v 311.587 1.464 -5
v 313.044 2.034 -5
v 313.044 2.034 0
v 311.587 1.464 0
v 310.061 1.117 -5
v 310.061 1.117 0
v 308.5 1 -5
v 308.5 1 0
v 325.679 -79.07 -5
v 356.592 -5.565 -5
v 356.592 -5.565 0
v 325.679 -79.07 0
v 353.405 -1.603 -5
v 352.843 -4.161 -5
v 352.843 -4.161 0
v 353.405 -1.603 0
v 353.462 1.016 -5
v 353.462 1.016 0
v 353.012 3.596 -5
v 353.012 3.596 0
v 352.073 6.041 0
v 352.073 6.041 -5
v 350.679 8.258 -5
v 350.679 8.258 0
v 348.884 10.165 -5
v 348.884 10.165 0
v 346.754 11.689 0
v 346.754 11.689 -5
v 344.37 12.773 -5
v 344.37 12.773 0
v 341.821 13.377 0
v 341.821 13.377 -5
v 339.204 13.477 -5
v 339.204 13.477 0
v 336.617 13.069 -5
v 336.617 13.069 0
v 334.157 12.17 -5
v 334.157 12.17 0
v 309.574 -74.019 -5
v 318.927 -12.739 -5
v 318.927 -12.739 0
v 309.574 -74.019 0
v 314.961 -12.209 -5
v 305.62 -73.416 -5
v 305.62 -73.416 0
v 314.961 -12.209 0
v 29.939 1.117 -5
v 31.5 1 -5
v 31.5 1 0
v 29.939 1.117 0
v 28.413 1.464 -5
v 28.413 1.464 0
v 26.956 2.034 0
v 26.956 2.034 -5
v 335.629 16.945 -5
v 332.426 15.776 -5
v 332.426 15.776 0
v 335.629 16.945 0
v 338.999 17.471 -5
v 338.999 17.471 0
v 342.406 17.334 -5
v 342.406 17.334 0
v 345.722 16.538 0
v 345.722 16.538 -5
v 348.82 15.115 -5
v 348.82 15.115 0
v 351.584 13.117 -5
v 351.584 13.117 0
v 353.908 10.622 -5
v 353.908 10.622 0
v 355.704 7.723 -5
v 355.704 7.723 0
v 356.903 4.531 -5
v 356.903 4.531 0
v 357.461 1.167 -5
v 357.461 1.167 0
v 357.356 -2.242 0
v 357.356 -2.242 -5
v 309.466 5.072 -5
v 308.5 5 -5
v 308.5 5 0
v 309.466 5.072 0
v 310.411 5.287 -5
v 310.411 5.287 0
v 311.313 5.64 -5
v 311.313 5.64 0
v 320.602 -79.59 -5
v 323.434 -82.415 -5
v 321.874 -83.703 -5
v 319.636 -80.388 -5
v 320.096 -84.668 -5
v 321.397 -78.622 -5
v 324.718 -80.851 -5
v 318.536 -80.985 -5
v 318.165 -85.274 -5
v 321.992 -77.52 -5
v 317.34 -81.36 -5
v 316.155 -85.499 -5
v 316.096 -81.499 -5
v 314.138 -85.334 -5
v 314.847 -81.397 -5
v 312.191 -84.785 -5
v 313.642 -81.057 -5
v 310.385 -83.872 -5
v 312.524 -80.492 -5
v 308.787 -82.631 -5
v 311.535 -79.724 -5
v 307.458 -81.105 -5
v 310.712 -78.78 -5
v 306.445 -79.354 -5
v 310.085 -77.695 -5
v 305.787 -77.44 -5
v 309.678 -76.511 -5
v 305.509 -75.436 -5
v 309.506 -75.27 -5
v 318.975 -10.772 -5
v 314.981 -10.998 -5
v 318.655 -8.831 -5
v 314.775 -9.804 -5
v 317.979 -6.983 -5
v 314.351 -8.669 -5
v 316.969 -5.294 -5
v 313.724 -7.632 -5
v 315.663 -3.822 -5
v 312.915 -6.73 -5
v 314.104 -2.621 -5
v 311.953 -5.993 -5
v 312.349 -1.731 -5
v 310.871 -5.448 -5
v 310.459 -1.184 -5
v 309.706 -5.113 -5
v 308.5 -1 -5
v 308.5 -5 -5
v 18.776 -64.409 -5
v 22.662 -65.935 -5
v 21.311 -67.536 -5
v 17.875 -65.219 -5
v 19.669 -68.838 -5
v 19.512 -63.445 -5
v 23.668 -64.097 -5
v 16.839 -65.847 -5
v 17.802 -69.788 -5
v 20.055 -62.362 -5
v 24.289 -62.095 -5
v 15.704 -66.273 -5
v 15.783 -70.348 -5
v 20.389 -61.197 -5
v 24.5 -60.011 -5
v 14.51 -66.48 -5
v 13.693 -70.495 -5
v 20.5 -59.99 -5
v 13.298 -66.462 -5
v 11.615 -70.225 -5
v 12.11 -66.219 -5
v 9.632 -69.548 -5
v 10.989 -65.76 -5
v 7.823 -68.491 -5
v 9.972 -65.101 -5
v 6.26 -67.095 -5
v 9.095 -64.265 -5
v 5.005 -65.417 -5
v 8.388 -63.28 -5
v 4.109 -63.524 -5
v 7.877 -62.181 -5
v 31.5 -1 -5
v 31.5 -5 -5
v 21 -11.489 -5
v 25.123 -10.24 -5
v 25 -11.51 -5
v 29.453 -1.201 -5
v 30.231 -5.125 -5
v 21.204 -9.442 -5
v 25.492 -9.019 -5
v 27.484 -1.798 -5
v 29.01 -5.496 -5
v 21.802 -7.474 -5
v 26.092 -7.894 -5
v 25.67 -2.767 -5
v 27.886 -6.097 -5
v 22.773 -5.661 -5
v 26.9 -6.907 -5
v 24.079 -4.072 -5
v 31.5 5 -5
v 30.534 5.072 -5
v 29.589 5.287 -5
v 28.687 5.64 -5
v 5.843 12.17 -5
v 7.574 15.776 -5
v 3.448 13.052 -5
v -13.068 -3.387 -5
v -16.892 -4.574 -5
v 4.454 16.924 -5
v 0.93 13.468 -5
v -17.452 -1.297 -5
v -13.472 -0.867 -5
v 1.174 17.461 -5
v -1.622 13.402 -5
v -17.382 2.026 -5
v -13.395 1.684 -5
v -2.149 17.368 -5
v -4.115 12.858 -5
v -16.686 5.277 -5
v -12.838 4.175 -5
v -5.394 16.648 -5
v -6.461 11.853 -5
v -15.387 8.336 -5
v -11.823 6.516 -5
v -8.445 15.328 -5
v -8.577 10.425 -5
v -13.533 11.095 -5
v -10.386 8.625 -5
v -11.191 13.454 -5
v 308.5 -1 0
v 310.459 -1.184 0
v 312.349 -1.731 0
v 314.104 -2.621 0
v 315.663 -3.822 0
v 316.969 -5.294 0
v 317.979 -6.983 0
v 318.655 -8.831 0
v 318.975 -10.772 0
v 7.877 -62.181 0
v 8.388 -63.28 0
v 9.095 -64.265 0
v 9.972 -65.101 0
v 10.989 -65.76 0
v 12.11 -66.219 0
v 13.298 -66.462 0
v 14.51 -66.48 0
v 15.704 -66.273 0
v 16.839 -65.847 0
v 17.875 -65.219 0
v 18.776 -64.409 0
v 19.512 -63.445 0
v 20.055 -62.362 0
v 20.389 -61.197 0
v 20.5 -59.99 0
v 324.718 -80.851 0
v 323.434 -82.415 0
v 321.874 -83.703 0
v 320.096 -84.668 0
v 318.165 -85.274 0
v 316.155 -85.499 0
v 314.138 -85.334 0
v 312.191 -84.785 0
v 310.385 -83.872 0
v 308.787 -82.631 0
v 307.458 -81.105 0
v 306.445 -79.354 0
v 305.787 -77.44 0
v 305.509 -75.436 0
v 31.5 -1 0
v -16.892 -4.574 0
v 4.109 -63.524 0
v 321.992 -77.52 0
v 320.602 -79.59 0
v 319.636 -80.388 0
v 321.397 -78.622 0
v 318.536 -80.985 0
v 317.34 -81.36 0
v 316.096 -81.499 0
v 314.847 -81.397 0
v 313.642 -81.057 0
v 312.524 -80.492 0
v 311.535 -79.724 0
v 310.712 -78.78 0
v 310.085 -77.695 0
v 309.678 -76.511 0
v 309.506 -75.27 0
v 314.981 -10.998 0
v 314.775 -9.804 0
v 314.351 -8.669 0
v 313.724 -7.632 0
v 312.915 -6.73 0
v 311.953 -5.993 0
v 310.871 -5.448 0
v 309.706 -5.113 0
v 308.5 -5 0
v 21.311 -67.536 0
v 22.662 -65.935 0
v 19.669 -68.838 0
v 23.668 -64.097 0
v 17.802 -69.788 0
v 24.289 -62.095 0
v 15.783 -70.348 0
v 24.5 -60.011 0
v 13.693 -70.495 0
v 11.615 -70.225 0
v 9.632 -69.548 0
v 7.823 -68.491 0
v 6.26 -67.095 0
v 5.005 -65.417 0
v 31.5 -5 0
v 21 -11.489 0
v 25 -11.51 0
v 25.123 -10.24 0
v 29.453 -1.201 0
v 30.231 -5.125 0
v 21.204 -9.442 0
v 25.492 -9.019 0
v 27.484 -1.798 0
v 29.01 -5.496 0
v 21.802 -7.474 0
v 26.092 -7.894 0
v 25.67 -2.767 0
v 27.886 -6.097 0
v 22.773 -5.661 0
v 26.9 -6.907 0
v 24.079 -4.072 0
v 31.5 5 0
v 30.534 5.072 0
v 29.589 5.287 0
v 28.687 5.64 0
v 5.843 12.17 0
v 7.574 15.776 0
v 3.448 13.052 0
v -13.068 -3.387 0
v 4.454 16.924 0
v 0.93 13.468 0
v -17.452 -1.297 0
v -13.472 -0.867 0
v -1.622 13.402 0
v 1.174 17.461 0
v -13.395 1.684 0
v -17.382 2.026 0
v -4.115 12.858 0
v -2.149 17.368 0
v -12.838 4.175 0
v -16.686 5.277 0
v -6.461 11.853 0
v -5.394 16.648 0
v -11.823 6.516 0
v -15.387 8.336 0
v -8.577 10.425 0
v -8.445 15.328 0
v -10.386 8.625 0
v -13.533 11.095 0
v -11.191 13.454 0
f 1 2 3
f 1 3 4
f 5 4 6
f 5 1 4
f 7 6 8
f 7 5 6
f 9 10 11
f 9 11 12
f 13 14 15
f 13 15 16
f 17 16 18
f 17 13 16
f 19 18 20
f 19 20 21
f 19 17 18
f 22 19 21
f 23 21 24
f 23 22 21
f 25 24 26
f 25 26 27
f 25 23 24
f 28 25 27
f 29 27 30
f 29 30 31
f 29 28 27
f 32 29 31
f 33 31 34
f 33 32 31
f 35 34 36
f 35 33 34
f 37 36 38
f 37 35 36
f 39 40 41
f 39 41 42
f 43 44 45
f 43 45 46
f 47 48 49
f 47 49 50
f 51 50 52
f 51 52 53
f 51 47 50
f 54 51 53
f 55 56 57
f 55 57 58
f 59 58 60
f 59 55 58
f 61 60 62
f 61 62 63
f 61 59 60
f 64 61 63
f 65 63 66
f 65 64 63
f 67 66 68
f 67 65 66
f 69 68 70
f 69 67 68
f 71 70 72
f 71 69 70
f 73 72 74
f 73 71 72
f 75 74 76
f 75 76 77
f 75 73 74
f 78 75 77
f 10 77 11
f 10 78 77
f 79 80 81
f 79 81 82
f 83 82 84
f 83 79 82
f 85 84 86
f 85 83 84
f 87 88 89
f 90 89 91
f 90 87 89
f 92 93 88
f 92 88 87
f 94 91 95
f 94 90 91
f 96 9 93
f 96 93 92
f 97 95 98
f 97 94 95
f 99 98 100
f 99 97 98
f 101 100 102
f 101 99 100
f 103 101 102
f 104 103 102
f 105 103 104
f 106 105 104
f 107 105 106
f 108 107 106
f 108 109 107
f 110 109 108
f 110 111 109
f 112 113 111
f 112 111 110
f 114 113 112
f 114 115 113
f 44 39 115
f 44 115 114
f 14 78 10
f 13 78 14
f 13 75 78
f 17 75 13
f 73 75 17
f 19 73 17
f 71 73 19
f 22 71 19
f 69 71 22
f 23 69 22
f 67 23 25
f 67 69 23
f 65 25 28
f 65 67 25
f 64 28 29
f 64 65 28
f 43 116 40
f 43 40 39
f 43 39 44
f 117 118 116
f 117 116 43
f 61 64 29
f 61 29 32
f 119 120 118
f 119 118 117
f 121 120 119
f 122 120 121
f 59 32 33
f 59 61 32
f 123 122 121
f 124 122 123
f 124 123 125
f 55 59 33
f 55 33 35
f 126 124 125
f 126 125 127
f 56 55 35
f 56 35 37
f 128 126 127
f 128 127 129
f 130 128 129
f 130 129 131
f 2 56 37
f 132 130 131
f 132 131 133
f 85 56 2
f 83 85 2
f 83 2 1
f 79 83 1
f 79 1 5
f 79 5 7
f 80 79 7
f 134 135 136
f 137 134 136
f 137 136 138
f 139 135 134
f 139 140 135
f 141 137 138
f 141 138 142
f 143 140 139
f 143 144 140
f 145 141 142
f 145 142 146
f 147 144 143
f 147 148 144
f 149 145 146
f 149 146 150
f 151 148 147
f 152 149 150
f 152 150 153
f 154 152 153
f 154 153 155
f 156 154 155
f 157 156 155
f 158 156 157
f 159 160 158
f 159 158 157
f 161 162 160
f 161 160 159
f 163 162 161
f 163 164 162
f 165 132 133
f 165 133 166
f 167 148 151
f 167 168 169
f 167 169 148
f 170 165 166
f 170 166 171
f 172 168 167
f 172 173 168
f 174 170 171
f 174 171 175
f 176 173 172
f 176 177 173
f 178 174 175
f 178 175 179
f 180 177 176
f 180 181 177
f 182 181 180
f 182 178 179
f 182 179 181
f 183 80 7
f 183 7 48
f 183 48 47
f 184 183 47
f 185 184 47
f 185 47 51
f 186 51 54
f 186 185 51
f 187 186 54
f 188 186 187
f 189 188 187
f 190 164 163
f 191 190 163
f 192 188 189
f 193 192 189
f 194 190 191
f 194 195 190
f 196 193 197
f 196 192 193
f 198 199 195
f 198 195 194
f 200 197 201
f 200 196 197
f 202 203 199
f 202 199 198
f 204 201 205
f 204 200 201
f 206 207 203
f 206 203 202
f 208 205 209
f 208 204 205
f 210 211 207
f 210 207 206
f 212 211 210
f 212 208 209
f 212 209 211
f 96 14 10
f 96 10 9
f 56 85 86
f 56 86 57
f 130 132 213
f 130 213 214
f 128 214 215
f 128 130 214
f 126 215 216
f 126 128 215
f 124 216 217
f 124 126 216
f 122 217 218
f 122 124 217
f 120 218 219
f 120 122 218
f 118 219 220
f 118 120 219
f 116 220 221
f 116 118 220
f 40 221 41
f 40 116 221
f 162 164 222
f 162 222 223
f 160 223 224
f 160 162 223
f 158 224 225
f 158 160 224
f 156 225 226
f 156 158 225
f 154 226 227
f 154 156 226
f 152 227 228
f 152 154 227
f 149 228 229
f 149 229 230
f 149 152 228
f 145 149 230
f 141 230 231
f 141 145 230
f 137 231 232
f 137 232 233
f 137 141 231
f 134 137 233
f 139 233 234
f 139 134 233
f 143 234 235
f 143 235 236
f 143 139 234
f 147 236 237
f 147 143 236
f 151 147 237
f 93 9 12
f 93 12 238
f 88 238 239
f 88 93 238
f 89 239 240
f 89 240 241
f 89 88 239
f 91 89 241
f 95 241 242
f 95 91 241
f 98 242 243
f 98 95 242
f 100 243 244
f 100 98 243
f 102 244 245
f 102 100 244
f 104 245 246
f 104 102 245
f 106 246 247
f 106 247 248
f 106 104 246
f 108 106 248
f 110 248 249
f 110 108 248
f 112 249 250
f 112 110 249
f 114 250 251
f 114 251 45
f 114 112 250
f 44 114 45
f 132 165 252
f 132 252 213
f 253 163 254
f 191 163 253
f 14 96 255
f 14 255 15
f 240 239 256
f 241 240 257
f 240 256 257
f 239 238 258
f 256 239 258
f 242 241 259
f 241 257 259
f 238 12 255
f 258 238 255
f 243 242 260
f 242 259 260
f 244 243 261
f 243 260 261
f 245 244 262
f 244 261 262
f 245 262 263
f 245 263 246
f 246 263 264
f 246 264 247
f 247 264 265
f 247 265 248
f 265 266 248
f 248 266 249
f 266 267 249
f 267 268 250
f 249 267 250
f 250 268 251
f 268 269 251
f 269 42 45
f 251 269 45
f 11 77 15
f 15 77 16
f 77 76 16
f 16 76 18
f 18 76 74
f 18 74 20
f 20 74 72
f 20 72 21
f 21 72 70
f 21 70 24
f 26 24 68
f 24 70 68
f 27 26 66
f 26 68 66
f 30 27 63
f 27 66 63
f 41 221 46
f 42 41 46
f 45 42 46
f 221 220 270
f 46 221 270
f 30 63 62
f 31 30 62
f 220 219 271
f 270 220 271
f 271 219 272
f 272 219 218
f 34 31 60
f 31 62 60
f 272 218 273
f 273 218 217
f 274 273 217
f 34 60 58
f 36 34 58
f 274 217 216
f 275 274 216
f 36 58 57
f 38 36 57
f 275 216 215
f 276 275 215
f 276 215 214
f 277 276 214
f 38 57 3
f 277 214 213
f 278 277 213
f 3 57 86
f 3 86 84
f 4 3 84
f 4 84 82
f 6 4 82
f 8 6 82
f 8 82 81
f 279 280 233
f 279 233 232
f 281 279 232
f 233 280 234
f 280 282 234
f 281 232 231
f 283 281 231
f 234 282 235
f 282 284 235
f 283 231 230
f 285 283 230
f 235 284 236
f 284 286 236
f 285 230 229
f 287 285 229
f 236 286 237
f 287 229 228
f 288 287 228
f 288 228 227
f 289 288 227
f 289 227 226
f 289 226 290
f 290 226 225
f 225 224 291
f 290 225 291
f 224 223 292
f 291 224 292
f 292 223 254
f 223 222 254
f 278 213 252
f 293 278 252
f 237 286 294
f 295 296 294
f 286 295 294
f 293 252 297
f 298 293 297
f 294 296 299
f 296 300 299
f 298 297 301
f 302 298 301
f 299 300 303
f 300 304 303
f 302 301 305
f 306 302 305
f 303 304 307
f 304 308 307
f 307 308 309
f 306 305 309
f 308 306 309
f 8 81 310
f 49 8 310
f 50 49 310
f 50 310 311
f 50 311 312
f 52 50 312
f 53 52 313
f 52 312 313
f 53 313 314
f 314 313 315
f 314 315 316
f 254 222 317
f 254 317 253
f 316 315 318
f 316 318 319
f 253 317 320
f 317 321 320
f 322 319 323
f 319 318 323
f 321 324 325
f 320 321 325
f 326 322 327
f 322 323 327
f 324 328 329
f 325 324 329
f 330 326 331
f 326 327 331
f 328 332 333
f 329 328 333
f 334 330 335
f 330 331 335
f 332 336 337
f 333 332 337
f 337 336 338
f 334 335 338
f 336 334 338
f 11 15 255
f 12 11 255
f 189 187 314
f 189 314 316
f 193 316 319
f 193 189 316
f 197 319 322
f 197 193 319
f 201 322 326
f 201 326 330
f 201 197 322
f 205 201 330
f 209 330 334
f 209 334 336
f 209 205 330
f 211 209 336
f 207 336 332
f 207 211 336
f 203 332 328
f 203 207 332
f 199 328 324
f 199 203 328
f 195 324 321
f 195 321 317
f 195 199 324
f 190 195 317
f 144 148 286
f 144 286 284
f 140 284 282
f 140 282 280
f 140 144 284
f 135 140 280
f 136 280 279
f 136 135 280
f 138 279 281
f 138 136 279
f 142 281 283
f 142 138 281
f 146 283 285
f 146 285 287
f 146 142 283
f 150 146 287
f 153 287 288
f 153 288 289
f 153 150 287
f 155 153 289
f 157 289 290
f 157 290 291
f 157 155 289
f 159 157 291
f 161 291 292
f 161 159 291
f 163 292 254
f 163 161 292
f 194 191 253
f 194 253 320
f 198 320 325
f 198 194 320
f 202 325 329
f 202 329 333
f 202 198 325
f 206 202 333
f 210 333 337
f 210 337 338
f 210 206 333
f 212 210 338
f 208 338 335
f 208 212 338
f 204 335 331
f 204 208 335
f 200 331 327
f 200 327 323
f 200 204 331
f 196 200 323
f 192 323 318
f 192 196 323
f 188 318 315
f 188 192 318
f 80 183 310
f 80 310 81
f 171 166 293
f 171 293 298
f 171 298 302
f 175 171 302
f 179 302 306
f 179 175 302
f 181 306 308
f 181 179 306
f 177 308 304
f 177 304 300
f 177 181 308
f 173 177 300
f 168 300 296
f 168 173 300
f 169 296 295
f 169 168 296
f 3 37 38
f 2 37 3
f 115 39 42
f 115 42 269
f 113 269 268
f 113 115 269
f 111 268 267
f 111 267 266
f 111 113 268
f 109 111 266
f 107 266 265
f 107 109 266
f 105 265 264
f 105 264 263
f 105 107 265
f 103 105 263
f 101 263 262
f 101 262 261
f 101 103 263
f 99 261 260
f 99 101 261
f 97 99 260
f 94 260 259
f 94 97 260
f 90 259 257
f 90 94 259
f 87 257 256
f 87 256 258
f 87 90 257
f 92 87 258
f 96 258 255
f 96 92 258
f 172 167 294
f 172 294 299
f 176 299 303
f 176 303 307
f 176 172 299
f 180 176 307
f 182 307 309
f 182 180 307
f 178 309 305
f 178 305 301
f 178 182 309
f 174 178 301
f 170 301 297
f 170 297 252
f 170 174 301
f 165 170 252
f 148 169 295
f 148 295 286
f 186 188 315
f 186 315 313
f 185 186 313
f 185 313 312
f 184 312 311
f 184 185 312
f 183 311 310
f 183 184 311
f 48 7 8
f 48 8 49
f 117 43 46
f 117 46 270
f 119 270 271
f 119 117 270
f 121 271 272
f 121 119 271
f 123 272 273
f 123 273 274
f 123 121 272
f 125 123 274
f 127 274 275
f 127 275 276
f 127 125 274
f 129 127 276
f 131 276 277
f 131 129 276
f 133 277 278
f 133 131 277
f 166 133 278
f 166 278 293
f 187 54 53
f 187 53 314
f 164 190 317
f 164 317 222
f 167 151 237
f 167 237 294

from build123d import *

# Parameters (mm, degrees)
BOSS_EXTRUDE1_DEPTH = 5


with BuildPart() as part:
    # Sketch1 → Boss-Extrude1 (new body)
    with BuildSketch(Plane(origin=(0, 0, -5), x_dir=(-1, 0, 0), z_dir=(0, 0, -1))):
        with BuildLine():
            Line((-25.000007614, -11.509619935), (-24.499994503, -60.010855227))
            ThreePointArc((-24.499994503, -60.010855227), (-15.782590077, -70.347575927), (-4.10890071, -63.523653936))
            Line((-4.10890071, -63.523653936), (16.891801465, -4.573510965))
            ThreePointArc((16.891801465, -4.573510965), (11.190796465, 13.454223259), (-7.573775299, 15.776184877))
            Line((-7.573775299, 15.776184877), (-28.686884347, 5.640277106))
            ThreePointArc((-28.686884347, 5.640277106), (-30.057470291, 5.16209183), (-31.500000671, 5.000002061))
            Line((-31.500000671, 5.000002061), (-308.500000671, 5.000002061))
            ThreePointArc((-308.500000671, 5.000002061), (-309.942531001, 5.162091818), (-311.313116903, 5.640277062))
            Line((-311.313116903, 5.640277062), (-332.426226108, 15.776184506))
            ThreePointArc((-332.426226108, 15.776184506), (-351.584092911, 13.117120589), (-356.591608654, -5.564936777))
            Line((-356.591608654, -5.564936777), (-325.67891256, -79.070456081))
            ThreePointArc((-325.67891256, -79.070456081), (-313.151079009, -85.106115073), (-305.620183213, -73.415888323))
            Line((-305.620183213, -73.415888323), (-314.961196041, -12.209189089))
            ThreePointArc((-314.961196041, -12.209189089), (-313.340441716, -7.161780706), (-308.500000492, -4.999997939))
            Line((-308.500000492, -4.999997939), (-31.500000492, -4.999997939))
            ThreePointArc((-31.500000492, -4.999997939), (-26.900405783, -6.907207011), (-25.000007614, -11.509619935))
        make_face()
        with BuildLine():
            Line((-31.500000492, -0.999997939), (-308.500000492, -0.999997939))
            ThreePointArc((-308.500000492, -0.999997939), (-316.350566349, -4.527292887), (-318.926606245, -12.739309227))
            Line((-318.926606245, -12.739309227), (-309.574399245, -74.019357929))
            ThreePointArc((-309.574399245, -74.019357929), (-314.236382275, -81.256164837), (-321.991707669, -77.519804575))
            Line((-321.991707669, -77.519804575), (-352.84288251, -4.160573117))
            ThreePointArc((-352.84288251, -4.160573117), (-348.883942975, 10.16492029), (-334.157374559, 12.170199891))
            Line((-334.157374559, 12.170199891), (-313.044265354, 2.034292448))
            ThreePointArc((-313.044265354, 2.034292448), (-310.830241974, 1.261839361), (-308.500000671, 1.000002061))
            Line((-308.500000671, 1.000002061), (-31.500000671, 1.000002061))
            ThreePointArc((-31.500000671, 1.000002061), (-29.169759288, 1.261839379), (-26.95573584, 2.034292518))
            Line((-26.95573584, 2.034292518), (-5.842626792, 12.170200289))
            ThreePointArc((-5.842626792, 12.170200289), (8.576792018, 10.425386169), (13.068119724, -3.387361226))
            Line((13.068119724, -3.387361226), (-7.876938579, -62.181308743))
            ThreePointArc((-7.876938579, -62.181308743), (-15.111557007, -66.404249616), (-20.499993004, -59.990382536))
            Line((-20.499993004, -59.990382536), (-21.000006097, -11.489149069))
            ThreePointArc((-21.000006097, -11.489149069), (-24.079215936, -4.071542072), (-31.500000492, -0.999997939))
        make_face(mode=Mode.SUBTRACT)
    extrude(amount=-BOSS_EXTRUDE1_DEPTH)


solid = part.part
